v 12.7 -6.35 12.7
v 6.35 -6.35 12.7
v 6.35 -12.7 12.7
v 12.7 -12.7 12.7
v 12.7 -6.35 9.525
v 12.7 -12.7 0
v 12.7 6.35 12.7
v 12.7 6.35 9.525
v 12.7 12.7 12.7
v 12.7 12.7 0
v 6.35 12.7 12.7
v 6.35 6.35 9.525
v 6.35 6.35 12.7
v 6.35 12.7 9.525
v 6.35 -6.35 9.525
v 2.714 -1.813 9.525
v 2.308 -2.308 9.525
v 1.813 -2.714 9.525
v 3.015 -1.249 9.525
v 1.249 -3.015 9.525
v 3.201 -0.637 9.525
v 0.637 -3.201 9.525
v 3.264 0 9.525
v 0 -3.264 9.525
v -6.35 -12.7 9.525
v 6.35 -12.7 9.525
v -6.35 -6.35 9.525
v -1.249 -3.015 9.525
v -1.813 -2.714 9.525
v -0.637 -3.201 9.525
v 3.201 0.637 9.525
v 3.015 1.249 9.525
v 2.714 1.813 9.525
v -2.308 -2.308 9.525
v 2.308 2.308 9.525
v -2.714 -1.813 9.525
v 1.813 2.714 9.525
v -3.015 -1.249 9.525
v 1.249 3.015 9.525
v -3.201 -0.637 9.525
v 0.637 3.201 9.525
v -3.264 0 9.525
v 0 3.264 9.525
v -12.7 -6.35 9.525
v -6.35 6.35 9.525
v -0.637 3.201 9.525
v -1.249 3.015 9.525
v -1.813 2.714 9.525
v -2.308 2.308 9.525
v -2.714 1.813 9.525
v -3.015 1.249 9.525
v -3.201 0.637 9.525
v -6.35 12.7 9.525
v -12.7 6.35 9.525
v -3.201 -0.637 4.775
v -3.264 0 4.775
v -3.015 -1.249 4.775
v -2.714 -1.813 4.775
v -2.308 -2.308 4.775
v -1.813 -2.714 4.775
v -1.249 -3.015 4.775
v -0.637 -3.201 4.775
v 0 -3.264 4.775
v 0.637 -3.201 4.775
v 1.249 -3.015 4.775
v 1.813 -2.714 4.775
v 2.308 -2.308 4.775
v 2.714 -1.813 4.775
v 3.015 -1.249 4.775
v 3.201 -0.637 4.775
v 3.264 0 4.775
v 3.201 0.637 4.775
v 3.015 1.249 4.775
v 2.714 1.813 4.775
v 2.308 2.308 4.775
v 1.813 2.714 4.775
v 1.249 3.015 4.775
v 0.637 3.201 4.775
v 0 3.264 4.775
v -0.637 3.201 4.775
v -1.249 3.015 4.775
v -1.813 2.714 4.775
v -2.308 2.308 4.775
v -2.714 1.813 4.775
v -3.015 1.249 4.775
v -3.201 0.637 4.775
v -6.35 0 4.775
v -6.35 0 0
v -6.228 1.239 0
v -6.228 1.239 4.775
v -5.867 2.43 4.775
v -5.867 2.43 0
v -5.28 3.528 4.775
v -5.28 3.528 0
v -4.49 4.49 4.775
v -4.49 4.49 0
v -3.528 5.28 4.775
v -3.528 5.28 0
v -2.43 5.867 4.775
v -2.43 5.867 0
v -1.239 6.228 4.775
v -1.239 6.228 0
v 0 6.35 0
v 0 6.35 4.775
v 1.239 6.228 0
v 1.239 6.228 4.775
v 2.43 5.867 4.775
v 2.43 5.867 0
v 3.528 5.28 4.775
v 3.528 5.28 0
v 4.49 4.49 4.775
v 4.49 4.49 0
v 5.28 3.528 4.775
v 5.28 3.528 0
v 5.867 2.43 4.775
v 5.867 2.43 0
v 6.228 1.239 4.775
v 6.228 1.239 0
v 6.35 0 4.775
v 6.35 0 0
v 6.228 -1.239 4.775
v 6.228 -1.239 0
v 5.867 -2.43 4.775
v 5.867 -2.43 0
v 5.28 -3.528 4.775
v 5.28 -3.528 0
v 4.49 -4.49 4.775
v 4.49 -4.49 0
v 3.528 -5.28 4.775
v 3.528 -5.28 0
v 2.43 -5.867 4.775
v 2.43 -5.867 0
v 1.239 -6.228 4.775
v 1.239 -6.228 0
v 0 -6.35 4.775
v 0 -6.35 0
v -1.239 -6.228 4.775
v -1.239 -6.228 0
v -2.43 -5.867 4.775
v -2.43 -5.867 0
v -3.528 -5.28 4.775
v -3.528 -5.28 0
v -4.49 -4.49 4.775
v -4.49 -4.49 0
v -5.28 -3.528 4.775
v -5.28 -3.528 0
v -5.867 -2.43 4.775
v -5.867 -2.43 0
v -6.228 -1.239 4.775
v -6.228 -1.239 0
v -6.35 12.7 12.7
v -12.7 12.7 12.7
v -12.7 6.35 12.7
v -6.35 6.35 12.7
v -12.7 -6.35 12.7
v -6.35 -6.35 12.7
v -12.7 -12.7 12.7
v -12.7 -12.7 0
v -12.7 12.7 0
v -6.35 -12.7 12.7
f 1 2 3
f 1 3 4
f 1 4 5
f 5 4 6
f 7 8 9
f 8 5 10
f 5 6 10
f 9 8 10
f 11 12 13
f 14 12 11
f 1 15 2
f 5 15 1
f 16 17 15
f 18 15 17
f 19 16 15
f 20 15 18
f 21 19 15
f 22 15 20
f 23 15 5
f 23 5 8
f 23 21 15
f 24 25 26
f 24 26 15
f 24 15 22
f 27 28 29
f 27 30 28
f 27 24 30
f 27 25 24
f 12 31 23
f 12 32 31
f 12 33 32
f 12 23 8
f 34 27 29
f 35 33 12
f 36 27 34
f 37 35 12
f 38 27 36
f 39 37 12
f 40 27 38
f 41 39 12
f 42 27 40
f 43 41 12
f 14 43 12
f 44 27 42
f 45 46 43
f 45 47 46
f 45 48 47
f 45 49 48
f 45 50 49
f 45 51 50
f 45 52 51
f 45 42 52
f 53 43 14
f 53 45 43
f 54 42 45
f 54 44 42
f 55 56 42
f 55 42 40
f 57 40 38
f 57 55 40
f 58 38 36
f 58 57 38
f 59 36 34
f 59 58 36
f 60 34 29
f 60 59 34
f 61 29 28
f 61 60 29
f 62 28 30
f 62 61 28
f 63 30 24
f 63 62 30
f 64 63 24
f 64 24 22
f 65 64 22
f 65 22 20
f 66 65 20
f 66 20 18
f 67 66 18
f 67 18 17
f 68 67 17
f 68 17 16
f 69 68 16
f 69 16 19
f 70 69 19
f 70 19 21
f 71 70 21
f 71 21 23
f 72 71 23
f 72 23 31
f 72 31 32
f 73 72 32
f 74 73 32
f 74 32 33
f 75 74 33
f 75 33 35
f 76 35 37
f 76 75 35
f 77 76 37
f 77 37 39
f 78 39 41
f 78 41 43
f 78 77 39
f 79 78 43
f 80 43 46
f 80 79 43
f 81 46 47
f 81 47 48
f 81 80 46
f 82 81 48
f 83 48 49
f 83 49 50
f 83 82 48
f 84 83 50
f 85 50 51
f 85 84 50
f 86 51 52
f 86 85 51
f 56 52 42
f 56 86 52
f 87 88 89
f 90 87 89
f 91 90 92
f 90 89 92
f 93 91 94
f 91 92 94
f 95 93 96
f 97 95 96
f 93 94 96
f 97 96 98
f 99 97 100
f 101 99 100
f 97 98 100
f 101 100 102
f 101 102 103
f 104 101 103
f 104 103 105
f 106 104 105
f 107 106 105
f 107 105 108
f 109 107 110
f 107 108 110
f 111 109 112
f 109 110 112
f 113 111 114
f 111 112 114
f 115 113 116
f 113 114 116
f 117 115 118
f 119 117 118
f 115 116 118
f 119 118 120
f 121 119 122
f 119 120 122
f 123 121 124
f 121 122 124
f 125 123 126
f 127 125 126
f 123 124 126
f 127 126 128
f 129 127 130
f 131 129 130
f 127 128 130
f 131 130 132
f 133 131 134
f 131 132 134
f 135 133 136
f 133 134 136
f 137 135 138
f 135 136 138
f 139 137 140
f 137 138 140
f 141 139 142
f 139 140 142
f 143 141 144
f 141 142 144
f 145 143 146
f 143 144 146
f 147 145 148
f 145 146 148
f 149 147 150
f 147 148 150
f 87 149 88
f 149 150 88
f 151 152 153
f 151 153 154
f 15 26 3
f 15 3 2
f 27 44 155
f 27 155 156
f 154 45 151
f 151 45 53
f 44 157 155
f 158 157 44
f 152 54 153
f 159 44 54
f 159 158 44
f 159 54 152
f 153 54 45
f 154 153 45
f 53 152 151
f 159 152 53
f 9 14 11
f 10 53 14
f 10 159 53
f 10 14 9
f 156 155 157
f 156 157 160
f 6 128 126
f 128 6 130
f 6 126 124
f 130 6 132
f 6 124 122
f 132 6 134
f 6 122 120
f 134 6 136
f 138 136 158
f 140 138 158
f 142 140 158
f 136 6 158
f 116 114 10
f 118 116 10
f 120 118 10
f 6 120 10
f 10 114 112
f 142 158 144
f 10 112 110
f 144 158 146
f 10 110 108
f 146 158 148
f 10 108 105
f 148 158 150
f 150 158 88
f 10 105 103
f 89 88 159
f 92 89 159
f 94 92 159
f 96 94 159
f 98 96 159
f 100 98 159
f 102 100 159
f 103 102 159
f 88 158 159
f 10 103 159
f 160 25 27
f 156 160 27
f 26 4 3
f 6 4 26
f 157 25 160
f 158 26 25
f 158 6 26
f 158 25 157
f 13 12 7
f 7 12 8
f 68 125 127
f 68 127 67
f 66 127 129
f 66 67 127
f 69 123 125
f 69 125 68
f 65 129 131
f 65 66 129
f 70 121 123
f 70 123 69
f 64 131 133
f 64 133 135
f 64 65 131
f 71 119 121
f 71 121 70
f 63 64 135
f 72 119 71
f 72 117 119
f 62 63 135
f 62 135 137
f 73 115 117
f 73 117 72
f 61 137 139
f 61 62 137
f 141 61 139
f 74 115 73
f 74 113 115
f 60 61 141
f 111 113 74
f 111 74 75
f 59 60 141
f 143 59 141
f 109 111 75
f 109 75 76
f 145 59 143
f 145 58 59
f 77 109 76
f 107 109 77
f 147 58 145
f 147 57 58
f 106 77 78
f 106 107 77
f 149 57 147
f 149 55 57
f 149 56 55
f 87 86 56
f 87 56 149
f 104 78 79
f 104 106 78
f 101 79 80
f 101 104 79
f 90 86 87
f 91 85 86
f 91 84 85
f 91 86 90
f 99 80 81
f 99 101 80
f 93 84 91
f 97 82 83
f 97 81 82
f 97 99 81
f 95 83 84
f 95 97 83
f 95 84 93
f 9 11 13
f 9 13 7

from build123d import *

# Parameters (mm, degrees)
SKETCH1_W           = 25.4
SKETCH1_H           = 25.4
BOSS_EXTRUDE1_DEPTH = 9.525
SKETCH2_R           = 6.35
CUT_EXTRUDE1_DEPTH  = 4.7752
SKETCH1_3_R         = 3.2639
CUT_EXTRUDE2_DEPTH  = 9.525
SKETCH3_W           = 6.35
SKETCH3_H           = 6.35
BOSS_EXTRUDE3_DEPTH = 3.175


with BuildPart() as part:
    # Sketch1 → Boss-Extrude1 (new body)
    with BuildSketch(Plane(origin=(0, 0, 0), x_dir=(0, 1, 0), z_dir=(0, 0, 1))):
        Rectangle(SKETCH1_W, SKETCH1_H)
    extrude(amount=BOSS_EXTRUDE1_DEPTH)

    # Sketch2 → Cut-Extrude1 (cut)
    with BuildSketch(Plane(origin=(0, 0, 0), x_dir=(1, 0, 0), z_dir=(0, 0, -1))):
        Circle(SKETCH2_R)
    extrude(amount=-CUT_EXTRUDE1_DEPTH, mode=Mode.SUBTRACT)

    # Sketch1<3> → Cut-Extrude2 (cut)
    with BuildSketch(Plane(origin=(0, 0, 0), x_dir=(0, 1, 0), z_dir=(0, 0, 1))):
        Circle(SKETCH1_3_R)
    extrude(amount=CUT_EXTRUDE2_DEPTH, mode=Mode.SUBTRACT)

    # Sketch3 → Boss-Extrude3 (add)
    with BuildSketch(Plane.XY.offset(9.525)):
        with Locations((-9.525, 9.525)):
            Rectangle(SKETCH3_W, SKETCH3_H)
        with Locations((-9.525, -9.525)):
            Rectangle(SKETCH3_W, SKETCH3_H)
        with Locations((9.525, -9.525)):
            Rectangle(SKETCH3_W, SKETCH3_H)
        with Locations((9.525, 9.525)):
            Rectangle(SKETCH3_W, SKETCH3_H)
    extrude(amount=BOSS_EXTRUDE3_DEPTH)


solid = part.part
